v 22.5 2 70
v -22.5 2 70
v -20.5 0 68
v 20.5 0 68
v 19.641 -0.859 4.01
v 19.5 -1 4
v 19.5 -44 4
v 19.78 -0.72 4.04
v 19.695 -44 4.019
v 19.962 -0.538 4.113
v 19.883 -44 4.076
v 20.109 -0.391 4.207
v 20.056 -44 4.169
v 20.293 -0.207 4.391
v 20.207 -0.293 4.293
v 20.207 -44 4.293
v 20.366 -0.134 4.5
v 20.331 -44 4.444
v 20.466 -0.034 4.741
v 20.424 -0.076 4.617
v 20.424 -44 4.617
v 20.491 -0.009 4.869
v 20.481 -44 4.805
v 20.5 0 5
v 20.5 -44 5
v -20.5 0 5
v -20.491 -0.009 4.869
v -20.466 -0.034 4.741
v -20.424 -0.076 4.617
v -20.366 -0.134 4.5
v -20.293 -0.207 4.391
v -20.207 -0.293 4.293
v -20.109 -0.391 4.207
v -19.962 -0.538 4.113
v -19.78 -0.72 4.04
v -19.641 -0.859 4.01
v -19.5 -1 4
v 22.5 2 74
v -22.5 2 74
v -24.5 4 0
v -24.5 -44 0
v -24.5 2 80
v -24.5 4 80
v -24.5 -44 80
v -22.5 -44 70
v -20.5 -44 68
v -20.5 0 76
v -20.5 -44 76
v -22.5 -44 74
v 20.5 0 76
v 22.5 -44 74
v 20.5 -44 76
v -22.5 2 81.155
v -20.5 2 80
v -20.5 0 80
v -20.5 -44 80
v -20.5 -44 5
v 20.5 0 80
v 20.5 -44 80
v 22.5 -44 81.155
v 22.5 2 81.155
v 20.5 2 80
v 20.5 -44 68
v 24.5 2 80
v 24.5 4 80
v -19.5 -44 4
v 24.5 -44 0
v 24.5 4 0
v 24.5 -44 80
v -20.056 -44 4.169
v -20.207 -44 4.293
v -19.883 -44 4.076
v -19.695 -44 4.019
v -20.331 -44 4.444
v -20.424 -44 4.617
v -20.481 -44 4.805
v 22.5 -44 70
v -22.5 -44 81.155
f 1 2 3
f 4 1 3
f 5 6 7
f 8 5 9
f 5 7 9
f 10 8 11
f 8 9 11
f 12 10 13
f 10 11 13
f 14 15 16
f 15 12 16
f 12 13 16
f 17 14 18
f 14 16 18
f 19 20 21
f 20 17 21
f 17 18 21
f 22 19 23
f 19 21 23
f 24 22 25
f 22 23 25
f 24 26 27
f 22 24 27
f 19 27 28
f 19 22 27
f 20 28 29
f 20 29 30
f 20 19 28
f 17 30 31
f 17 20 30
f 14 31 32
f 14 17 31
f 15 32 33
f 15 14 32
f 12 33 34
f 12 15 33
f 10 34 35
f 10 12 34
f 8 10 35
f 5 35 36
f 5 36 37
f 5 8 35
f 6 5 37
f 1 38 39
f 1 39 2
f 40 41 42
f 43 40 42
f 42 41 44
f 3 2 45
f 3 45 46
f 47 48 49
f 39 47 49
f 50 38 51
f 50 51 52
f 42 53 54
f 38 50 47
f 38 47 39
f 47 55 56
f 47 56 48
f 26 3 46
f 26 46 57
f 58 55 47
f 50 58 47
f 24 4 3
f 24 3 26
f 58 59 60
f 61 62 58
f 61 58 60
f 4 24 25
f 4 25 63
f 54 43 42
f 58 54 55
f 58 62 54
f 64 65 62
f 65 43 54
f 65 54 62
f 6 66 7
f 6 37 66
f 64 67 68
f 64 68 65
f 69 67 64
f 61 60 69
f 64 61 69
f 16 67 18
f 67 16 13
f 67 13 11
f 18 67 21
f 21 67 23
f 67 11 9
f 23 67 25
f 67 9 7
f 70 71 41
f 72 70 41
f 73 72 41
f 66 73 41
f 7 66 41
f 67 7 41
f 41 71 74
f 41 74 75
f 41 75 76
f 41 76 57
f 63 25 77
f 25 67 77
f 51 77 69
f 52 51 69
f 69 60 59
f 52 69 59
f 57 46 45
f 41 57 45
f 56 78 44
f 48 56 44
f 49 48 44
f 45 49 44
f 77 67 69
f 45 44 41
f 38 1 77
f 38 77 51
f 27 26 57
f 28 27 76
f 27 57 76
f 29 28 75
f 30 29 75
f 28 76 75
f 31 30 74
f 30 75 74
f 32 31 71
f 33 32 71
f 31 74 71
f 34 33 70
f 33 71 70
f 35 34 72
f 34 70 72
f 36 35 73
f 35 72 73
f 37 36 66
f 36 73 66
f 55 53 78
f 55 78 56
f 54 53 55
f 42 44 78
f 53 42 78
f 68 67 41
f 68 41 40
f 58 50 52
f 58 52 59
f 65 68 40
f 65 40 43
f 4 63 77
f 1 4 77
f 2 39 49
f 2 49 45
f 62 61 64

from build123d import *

# Parameters (mm, degrees)
EXTRUDE001_DEPTH = 24.5
EXTRUDE_DEPTH    = 46
FILLET001_R      = 1


with BuildPart() as extrude001:
    # Sketch002 (on Sketch) → Extrude001 (new body, symmetric)
    with BuildSketch(Plane(origin=(0, 0, 0), x_dir=(0, 0, 1), z_dir=(1, 0, 0))):
        Polygon((0, 0), (0, -4), (68, -4), (80, -4), (80, 0), (76, 0), (74, -2), (70, -2), (68, 0), align=None)
    extrude(amount=EXTRUDE001_DEPTH, both=True)


with BuildPart() as bin_holder:
    # Sketch001 → Extrude (new body)
    with BuildSketch(Plane.XZ):
        Polygon((24.5, 0), (-24.5, 0), (-24.5, 80), (-22.5, 81.154701), (-20.5, 80), (-20.5, 76), (-22.5, 74), (-22.5, 70), (-20.5, 68), (-20.5, 4), (20.5, 4), (20.5, 68), (22.5, 70), (22.5, 74), (20.5, 76), (20.5, 80), (22.5, 81.154701), (24.5, 80), align=None)
    extrude(amount=EXTRUDE_DEPTH)


with BuildPart() as bin_holder_1:
    # Extrude placement: moved
    add(bin_holder.part.moved(Location((0, 2, 0))))

    # Fusion: union Extrude001
    add(extrude001.part)

    # Fillet001
    fillet001_edges = [bin_holder_1.edges().sort_by_distance(p)[0] for p in [
        (-20.5, -22, 4),
        (0, 0, 4),
        (20.5, -22, 4),
    ]]
    fillet(fillet001_edges, radius=FILLET001_R)


solid = bin_holder_1.part
